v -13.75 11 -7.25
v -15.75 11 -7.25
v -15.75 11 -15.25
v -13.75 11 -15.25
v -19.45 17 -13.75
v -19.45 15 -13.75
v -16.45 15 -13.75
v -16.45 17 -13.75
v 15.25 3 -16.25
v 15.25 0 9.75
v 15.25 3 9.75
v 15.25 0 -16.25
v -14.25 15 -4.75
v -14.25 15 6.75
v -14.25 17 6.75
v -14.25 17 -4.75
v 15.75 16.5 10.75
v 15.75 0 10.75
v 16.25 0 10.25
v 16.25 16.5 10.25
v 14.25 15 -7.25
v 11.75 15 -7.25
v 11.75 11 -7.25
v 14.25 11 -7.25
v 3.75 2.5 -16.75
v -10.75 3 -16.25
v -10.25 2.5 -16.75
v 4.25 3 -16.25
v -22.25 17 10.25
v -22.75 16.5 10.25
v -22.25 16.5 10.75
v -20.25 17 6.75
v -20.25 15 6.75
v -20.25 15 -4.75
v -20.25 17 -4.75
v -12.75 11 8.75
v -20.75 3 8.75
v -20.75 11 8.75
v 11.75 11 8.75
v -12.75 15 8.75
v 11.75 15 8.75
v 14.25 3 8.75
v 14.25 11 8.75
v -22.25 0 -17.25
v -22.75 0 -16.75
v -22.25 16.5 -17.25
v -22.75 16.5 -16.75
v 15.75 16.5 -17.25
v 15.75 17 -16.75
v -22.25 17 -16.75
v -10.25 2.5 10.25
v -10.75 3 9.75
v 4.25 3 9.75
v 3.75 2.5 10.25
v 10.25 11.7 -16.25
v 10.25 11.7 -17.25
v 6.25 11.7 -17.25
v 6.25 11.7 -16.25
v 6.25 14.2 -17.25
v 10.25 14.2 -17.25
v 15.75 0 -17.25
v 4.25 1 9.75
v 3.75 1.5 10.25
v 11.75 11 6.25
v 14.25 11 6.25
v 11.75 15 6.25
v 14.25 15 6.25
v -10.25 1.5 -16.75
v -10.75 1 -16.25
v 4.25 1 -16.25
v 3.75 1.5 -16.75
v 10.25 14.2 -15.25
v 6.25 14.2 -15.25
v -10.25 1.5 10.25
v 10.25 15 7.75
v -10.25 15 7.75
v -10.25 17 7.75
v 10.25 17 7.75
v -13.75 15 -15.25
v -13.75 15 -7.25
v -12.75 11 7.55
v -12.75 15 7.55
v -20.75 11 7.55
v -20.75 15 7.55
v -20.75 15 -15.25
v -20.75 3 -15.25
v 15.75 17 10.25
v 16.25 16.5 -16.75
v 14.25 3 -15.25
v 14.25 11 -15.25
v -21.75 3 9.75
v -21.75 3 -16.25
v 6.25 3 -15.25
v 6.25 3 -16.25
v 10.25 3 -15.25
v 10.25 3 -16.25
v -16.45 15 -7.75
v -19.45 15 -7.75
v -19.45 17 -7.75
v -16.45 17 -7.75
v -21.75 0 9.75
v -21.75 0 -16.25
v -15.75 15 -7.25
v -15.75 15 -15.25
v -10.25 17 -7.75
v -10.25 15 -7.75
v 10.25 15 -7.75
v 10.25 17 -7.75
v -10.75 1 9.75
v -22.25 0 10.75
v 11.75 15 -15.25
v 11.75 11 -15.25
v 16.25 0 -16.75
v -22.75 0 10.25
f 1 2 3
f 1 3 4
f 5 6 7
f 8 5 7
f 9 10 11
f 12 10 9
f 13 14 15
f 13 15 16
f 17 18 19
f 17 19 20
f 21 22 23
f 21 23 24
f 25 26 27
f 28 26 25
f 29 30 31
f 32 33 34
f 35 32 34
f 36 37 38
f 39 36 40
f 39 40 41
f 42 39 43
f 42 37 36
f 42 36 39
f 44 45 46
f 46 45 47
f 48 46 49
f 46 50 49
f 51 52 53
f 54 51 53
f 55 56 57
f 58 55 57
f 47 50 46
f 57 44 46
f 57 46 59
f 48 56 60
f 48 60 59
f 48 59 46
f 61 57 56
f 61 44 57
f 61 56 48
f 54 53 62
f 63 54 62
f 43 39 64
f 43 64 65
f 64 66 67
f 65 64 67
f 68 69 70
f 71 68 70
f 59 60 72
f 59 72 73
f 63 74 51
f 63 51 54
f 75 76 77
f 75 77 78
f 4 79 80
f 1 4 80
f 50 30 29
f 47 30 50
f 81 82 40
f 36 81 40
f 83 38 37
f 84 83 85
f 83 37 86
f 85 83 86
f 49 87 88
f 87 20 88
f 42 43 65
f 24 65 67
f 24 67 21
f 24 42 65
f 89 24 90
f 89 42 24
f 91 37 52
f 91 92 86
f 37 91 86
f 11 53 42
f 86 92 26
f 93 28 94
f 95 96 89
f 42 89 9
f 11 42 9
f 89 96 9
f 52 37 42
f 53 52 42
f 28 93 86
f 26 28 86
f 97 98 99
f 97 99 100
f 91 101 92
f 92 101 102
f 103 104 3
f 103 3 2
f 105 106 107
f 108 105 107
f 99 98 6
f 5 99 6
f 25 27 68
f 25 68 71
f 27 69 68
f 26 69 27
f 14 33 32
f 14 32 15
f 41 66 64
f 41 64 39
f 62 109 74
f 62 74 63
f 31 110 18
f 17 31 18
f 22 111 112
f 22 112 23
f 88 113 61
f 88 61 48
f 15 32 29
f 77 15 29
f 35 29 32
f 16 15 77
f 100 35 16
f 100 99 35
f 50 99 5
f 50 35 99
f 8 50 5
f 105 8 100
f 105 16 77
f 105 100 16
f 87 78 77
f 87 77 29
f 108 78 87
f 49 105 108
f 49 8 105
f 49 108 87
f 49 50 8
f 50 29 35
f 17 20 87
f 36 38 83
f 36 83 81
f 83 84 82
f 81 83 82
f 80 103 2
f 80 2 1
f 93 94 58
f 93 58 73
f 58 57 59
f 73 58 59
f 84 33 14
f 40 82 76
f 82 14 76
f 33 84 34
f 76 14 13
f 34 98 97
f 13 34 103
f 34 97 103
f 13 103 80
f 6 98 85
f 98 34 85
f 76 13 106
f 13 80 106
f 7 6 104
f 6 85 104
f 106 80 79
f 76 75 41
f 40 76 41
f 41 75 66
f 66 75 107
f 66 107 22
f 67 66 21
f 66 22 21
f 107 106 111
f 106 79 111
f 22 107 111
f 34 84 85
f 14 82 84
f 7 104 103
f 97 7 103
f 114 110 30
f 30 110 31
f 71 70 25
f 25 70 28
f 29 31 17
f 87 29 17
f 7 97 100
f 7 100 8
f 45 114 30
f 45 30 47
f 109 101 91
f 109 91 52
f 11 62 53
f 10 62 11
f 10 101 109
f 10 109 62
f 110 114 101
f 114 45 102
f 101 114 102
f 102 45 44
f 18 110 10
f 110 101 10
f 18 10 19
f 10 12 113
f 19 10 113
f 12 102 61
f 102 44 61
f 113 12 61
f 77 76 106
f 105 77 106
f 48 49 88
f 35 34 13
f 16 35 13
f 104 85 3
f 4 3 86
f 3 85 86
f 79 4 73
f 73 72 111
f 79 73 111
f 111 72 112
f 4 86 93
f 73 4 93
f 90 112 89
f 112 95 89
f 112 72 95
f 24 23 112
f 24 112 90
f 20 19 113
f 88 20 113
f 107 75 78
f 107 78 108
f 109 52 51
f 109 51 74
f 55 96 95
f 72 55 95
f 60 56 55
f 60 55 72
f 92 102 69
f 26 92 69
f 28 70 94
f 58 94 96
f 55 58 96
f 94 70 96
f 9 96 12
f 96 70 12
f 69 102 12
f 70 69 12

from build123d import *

# Parameters (mm, degrees)
SKETCH_1_W               = 39
SKETCH_1_H               = 28
EXTRUDE_1_DEPTH          = 17
SKETCH_2_W               = 20.5
SKETCH_2_H               = 15.5
CUT_EXTRUDE_1_DEPTH      = 34.228376427
SKETCH_3_W               = 35
SKETCH_3_H               = 24
CUT_EXTRUDE_2_DEPTH      = 15
SKETCH_5_W               = 6
SKETCH_5_H               = 11.5
CUT_EXTRUDE_4_DEPTH      = 34.228376427
SKETCH_7_W               = 3
SKETCH_7_H               = 6
CUT_EXTRUDE_5_DEPTH      = 34.228376427
SKETCH_6_W               = 2.5
SKETCH_6_H               = 8
SKETCH_6_H_2             = 2.5
SKETCH_6_W_2             = 8
SKETCH_6_H_3             = 1.2
SKETCH_6_W_3             = 2
EXTRUDE_2_DEPTH          = 4
SKETCH_8_W               = 37
SKETCH_8_H               = 26
CUT_EXTRUDE_6_DEPTH      = 3
SKETCH_9_W               = 15
SKETCH_9_H               = 2
CUT_EXTRUDE_7_DEPTH      = 0.5
CUT_EXTRUDE_7_DRAFT      = -45
MIRROR_1_COPY_1_SKETCH_W = 15
MIRROR_1_COPY_1_SKETCH_H = 2
MIRROR_1_COPY_1_DEPTH    = 0.5
MIRROR_1_COPY_1_DRAFT    = -45
CUT_EXTRUDE_8_REACH      = 41.882
SKETCH_12_W              = 4
SKETCH_12_H              = 2.5
CHAMFER_1_SIZE           = 0.5
SKETCH_13_W              = 4
SKETCH_13_H              = 1
CUT_EXTRUDE_9_DEPTH      = 11.7


with BuildPart() as part:
    # Эскиз1 → Бобышка-Вытянуть1 (new body)
    with BuildSketch(Plane(origin=(0, 0, 0), x_dir=(1, 0, 0), z_dir=(0, 1, 0))):
        with Locations((-3.25, 3.25)):
            Rectangle(SKETCH_1_W, SKETCH_1_H)
    extrude(amount=EXTRUDE_1_DEPTH)

    # Эскиз2 → Вырез-Вытянуть1 (cut, through all)
    with BuildSketch(Plane(origin=(0, 0, 0), x_dir=(1, 0, 0), z_dir=(0, 1, 0))):
        Rectangle(SKETCH_2_W, SKETCH_2_H)
    extrude(amount=CUT_EXTRUDE_1_DEPTH, mode=Mode.SUBTRACT)

    # Эскиз3 → Вырез-Вытянуть2 (cut)
    with BuildSketch(Plane(origin=(0, 0, 0), x_dir=(1, 0, 0), z_dir=(0, 1, 0))):
        with Locations((-3.25, 3.25)):
            Rectangle(SKETCH_3_W, SKETCH_3_H)
    extrude(amount=CUT_EXTRUDE_2_DEPTH, mode=Mode.SUBTRACT)

    # Эскиз5 → Вырез-Вытянуть4 (cut, through all)
    with BuildSketch(Plane(origin=(0, 0, 0), x_dir=(1, 0, 0), z_dir=(0, 1, 0))):
        with Locations((-17.25, -1)):
            Rectangle(SKETCH_5_W, SKETCH_5_H)
    extrude(amount=CUT_EXTRUDE_4_DEPTH, mode=Mode.SUBTRACT)

    # Эскиз7 → Вырез-Вытянуть5 (cut, through all)
    with BuildSketch(Plane(origin=(0, 0, 0), x_dir=(1, 0, 0), z_dir=(0, 1, 0))):
        with Locations((-17.95, 10.75)):
            Rectangle(SKETCH_7_W, SKETCH_7_H)
    extrude(amount=CUT_EXTRUDE_5_DEPTH, mode=Mode.SUBTRACT)

    # Эскиз6 → Бобышка-Вытянуть2 (add)
    with BuildSketch(Plane.XZ.offset(-15)):
        with Locations((13, -11.25)):
            Rectangle(SKETCH_6_W, SKETCH_6_H)
        with Locations((13, 7.5)):
            Rectangle(SKETCH_6_W, SKETCH_6_H_2)
        with Locations((-16.75, 8.15)):
            Rectangle(SKETCH_6_W_2, SKETCH_6_H_3)
        with Locations((-14.75, -11.25)):
            Rectangle(SKETCH_6_W_3, SKETCH_6_H)
    extrude(amount=EXTRUDE_2_DEPTH)

    # Эскиз8 → Вырез-Вытянуть6 (cut)
    with BuildSketch(Plane(origin=(0, 0, 0), x_dir=(1, 0, 0), z_dir=(0, 1, 0))):
        with Locations((-3.25, 3.25)):
            Rectangle(SKETCH_8_W, SKETCH_8_H)
    extrude(amount=CUT_EXTRUDE_6_DEPTH, mode=Mode.SUBTRACT)


with BuildPart() as cut_extrude_7_tool:
    # Эскиз9 → Вырез-Вытянуть7 (with draft: the straight prism first)
    with BuildSketch(Plane.XY.offset(-16.25)):
        with Locations((-3.25, 2)):
            Rectangle(SKETCH_9_W, SKETCH_9_H)
    extrude(amount=-CUT_EXTRUDE_7_DEPTH)
    # Вырез-Вытянуть7: the draft: its side faces are tilted about the plane it starts from
    cut_extrude_7_sides = [cut_extrude_7_tool.faces().sort_by_distance(p)[0] for p in [
        (-10.75, 2, -16.5),
        (-3.25, 1, -16.5),
        (4.25, 2, -16.5),
        (-3.25, 3, -16.5),
    ]]
    draft(cut_extrude_7_sides, Plane.XY.offset(-16.25), CUT_EXTRUDE_7_DRAFT)


with BuildPart() as part_1:
    add(part.part)

    # Вырез-Вытянуть7: cut by cut_extrude_7_tool
    add(cut_extrude_7_tool.part, mode=Mode.SUBTRACT)


with BuildPart() as mirror_1_copy_1_tool:
    # Зеркальное отражение1 copy 1 sketch → Зеркальное отражение1 copy 1 (with draft: the straight prism first)
    with BuildSketch(Plane(origin=(0, 0, 9.75), x_dir=(1, 0, 0), z_dir=(0, 0, -1))):
        with Locations((-3.25, -2)):
            Rectangle(MIRROR_1_COPY_1_SKETCH_W, MIRROR_1_COPY_1_SKETCH_H)
    extrude(amount=-MIRROR_1_COPY_1_DEPTH)
    # Зеркальное отражение1 copy 1: the draft: its side faces are tilted about the plane it starts from
    mirror_1_copy_1_sides = [mirror_1_copy_1_tool.faces().sort_by_distance(p)[0] for p in [
        (-10.75, 2, 10),
        (-3.25, 1, 10),
        (4.25, 2, 10),
        (-3.25, 3, 10),
    ]]
    draft(mirror_1_copy_1_sides, Plane(origin=(0, 0, 9.75), x_dir=(1, 0, 0), z_dir=(0, 0, -1)), MIRROR_1_COPY_1_DRAFT)


with BuildPart() as part_2:
    add(part_1.part)

    # Зеркальное отражение1 copy 1: cut by mirror_1_copy_1_tool
    add(mirror_1_copy_1_tool.part, mode=Mode.SUBTRACT)

    # Эскиз12 → Вырез-Вытянуть8 (cut, up to next)
    with BuildSketch(Plane(origin=(0, 0, -17.25), x_dir=(-1, 0, 0), z_dir=(0, 0, -1)), mode=Mode.PRIVATE) as cut_extrude_8_sk1:
        with Locations((-8.25, 12.95)):
            Rectangle(SKETCH_12_W, SKETCH_12_H)
    cut_extrude_8_tool1 = extrude(cut_extrude_8_sk1.sketch, amount=-CUT_EXTRUDE_8_REACH, mode=Mode.PRIVATE) & part_2.part
    add(cut_extrude_8_tool1.solids().sort_by_distance((8.25, 12.95, -17.25))[0], mode=Mode.SUBTRACT)

    # Фаска1
    chamfer_1_edges = [part_2.edges().sort_by_distance(p)[0] for p in [
        (16.25, 17, -3.25),
        (-3.25, 17, -17.25),
        (-22.75, 17, -3.25),
        (-22.75, 8.5, -17.25),
        (16.25, 8.5, -17.25),
        (16.25, 8.5, 10.75),
        (-22.75, 8.5, 10.75),
        (-3.25, 17, 10.75),
    ]]
    chamfer(chamfer_1_edges, length=CHAMFER_1_SIZE)

    # Эскиз13 → Вырез-Вытянуть9 (cut)
    with BuildSketch(Plane(origin=(0, 0, 0), x_dir=(1, 0, 0), z_dir=(0, 1, 0))):
        with Locations((8.25, 15.75)):
            Rectangle(SKETCH_13_W, SKETCH_13_H)
    extrude(amount=CUT_EXTRUDE_9_DEPTH, mode=Mode.SUBTRACT)


solid = part_2.part
